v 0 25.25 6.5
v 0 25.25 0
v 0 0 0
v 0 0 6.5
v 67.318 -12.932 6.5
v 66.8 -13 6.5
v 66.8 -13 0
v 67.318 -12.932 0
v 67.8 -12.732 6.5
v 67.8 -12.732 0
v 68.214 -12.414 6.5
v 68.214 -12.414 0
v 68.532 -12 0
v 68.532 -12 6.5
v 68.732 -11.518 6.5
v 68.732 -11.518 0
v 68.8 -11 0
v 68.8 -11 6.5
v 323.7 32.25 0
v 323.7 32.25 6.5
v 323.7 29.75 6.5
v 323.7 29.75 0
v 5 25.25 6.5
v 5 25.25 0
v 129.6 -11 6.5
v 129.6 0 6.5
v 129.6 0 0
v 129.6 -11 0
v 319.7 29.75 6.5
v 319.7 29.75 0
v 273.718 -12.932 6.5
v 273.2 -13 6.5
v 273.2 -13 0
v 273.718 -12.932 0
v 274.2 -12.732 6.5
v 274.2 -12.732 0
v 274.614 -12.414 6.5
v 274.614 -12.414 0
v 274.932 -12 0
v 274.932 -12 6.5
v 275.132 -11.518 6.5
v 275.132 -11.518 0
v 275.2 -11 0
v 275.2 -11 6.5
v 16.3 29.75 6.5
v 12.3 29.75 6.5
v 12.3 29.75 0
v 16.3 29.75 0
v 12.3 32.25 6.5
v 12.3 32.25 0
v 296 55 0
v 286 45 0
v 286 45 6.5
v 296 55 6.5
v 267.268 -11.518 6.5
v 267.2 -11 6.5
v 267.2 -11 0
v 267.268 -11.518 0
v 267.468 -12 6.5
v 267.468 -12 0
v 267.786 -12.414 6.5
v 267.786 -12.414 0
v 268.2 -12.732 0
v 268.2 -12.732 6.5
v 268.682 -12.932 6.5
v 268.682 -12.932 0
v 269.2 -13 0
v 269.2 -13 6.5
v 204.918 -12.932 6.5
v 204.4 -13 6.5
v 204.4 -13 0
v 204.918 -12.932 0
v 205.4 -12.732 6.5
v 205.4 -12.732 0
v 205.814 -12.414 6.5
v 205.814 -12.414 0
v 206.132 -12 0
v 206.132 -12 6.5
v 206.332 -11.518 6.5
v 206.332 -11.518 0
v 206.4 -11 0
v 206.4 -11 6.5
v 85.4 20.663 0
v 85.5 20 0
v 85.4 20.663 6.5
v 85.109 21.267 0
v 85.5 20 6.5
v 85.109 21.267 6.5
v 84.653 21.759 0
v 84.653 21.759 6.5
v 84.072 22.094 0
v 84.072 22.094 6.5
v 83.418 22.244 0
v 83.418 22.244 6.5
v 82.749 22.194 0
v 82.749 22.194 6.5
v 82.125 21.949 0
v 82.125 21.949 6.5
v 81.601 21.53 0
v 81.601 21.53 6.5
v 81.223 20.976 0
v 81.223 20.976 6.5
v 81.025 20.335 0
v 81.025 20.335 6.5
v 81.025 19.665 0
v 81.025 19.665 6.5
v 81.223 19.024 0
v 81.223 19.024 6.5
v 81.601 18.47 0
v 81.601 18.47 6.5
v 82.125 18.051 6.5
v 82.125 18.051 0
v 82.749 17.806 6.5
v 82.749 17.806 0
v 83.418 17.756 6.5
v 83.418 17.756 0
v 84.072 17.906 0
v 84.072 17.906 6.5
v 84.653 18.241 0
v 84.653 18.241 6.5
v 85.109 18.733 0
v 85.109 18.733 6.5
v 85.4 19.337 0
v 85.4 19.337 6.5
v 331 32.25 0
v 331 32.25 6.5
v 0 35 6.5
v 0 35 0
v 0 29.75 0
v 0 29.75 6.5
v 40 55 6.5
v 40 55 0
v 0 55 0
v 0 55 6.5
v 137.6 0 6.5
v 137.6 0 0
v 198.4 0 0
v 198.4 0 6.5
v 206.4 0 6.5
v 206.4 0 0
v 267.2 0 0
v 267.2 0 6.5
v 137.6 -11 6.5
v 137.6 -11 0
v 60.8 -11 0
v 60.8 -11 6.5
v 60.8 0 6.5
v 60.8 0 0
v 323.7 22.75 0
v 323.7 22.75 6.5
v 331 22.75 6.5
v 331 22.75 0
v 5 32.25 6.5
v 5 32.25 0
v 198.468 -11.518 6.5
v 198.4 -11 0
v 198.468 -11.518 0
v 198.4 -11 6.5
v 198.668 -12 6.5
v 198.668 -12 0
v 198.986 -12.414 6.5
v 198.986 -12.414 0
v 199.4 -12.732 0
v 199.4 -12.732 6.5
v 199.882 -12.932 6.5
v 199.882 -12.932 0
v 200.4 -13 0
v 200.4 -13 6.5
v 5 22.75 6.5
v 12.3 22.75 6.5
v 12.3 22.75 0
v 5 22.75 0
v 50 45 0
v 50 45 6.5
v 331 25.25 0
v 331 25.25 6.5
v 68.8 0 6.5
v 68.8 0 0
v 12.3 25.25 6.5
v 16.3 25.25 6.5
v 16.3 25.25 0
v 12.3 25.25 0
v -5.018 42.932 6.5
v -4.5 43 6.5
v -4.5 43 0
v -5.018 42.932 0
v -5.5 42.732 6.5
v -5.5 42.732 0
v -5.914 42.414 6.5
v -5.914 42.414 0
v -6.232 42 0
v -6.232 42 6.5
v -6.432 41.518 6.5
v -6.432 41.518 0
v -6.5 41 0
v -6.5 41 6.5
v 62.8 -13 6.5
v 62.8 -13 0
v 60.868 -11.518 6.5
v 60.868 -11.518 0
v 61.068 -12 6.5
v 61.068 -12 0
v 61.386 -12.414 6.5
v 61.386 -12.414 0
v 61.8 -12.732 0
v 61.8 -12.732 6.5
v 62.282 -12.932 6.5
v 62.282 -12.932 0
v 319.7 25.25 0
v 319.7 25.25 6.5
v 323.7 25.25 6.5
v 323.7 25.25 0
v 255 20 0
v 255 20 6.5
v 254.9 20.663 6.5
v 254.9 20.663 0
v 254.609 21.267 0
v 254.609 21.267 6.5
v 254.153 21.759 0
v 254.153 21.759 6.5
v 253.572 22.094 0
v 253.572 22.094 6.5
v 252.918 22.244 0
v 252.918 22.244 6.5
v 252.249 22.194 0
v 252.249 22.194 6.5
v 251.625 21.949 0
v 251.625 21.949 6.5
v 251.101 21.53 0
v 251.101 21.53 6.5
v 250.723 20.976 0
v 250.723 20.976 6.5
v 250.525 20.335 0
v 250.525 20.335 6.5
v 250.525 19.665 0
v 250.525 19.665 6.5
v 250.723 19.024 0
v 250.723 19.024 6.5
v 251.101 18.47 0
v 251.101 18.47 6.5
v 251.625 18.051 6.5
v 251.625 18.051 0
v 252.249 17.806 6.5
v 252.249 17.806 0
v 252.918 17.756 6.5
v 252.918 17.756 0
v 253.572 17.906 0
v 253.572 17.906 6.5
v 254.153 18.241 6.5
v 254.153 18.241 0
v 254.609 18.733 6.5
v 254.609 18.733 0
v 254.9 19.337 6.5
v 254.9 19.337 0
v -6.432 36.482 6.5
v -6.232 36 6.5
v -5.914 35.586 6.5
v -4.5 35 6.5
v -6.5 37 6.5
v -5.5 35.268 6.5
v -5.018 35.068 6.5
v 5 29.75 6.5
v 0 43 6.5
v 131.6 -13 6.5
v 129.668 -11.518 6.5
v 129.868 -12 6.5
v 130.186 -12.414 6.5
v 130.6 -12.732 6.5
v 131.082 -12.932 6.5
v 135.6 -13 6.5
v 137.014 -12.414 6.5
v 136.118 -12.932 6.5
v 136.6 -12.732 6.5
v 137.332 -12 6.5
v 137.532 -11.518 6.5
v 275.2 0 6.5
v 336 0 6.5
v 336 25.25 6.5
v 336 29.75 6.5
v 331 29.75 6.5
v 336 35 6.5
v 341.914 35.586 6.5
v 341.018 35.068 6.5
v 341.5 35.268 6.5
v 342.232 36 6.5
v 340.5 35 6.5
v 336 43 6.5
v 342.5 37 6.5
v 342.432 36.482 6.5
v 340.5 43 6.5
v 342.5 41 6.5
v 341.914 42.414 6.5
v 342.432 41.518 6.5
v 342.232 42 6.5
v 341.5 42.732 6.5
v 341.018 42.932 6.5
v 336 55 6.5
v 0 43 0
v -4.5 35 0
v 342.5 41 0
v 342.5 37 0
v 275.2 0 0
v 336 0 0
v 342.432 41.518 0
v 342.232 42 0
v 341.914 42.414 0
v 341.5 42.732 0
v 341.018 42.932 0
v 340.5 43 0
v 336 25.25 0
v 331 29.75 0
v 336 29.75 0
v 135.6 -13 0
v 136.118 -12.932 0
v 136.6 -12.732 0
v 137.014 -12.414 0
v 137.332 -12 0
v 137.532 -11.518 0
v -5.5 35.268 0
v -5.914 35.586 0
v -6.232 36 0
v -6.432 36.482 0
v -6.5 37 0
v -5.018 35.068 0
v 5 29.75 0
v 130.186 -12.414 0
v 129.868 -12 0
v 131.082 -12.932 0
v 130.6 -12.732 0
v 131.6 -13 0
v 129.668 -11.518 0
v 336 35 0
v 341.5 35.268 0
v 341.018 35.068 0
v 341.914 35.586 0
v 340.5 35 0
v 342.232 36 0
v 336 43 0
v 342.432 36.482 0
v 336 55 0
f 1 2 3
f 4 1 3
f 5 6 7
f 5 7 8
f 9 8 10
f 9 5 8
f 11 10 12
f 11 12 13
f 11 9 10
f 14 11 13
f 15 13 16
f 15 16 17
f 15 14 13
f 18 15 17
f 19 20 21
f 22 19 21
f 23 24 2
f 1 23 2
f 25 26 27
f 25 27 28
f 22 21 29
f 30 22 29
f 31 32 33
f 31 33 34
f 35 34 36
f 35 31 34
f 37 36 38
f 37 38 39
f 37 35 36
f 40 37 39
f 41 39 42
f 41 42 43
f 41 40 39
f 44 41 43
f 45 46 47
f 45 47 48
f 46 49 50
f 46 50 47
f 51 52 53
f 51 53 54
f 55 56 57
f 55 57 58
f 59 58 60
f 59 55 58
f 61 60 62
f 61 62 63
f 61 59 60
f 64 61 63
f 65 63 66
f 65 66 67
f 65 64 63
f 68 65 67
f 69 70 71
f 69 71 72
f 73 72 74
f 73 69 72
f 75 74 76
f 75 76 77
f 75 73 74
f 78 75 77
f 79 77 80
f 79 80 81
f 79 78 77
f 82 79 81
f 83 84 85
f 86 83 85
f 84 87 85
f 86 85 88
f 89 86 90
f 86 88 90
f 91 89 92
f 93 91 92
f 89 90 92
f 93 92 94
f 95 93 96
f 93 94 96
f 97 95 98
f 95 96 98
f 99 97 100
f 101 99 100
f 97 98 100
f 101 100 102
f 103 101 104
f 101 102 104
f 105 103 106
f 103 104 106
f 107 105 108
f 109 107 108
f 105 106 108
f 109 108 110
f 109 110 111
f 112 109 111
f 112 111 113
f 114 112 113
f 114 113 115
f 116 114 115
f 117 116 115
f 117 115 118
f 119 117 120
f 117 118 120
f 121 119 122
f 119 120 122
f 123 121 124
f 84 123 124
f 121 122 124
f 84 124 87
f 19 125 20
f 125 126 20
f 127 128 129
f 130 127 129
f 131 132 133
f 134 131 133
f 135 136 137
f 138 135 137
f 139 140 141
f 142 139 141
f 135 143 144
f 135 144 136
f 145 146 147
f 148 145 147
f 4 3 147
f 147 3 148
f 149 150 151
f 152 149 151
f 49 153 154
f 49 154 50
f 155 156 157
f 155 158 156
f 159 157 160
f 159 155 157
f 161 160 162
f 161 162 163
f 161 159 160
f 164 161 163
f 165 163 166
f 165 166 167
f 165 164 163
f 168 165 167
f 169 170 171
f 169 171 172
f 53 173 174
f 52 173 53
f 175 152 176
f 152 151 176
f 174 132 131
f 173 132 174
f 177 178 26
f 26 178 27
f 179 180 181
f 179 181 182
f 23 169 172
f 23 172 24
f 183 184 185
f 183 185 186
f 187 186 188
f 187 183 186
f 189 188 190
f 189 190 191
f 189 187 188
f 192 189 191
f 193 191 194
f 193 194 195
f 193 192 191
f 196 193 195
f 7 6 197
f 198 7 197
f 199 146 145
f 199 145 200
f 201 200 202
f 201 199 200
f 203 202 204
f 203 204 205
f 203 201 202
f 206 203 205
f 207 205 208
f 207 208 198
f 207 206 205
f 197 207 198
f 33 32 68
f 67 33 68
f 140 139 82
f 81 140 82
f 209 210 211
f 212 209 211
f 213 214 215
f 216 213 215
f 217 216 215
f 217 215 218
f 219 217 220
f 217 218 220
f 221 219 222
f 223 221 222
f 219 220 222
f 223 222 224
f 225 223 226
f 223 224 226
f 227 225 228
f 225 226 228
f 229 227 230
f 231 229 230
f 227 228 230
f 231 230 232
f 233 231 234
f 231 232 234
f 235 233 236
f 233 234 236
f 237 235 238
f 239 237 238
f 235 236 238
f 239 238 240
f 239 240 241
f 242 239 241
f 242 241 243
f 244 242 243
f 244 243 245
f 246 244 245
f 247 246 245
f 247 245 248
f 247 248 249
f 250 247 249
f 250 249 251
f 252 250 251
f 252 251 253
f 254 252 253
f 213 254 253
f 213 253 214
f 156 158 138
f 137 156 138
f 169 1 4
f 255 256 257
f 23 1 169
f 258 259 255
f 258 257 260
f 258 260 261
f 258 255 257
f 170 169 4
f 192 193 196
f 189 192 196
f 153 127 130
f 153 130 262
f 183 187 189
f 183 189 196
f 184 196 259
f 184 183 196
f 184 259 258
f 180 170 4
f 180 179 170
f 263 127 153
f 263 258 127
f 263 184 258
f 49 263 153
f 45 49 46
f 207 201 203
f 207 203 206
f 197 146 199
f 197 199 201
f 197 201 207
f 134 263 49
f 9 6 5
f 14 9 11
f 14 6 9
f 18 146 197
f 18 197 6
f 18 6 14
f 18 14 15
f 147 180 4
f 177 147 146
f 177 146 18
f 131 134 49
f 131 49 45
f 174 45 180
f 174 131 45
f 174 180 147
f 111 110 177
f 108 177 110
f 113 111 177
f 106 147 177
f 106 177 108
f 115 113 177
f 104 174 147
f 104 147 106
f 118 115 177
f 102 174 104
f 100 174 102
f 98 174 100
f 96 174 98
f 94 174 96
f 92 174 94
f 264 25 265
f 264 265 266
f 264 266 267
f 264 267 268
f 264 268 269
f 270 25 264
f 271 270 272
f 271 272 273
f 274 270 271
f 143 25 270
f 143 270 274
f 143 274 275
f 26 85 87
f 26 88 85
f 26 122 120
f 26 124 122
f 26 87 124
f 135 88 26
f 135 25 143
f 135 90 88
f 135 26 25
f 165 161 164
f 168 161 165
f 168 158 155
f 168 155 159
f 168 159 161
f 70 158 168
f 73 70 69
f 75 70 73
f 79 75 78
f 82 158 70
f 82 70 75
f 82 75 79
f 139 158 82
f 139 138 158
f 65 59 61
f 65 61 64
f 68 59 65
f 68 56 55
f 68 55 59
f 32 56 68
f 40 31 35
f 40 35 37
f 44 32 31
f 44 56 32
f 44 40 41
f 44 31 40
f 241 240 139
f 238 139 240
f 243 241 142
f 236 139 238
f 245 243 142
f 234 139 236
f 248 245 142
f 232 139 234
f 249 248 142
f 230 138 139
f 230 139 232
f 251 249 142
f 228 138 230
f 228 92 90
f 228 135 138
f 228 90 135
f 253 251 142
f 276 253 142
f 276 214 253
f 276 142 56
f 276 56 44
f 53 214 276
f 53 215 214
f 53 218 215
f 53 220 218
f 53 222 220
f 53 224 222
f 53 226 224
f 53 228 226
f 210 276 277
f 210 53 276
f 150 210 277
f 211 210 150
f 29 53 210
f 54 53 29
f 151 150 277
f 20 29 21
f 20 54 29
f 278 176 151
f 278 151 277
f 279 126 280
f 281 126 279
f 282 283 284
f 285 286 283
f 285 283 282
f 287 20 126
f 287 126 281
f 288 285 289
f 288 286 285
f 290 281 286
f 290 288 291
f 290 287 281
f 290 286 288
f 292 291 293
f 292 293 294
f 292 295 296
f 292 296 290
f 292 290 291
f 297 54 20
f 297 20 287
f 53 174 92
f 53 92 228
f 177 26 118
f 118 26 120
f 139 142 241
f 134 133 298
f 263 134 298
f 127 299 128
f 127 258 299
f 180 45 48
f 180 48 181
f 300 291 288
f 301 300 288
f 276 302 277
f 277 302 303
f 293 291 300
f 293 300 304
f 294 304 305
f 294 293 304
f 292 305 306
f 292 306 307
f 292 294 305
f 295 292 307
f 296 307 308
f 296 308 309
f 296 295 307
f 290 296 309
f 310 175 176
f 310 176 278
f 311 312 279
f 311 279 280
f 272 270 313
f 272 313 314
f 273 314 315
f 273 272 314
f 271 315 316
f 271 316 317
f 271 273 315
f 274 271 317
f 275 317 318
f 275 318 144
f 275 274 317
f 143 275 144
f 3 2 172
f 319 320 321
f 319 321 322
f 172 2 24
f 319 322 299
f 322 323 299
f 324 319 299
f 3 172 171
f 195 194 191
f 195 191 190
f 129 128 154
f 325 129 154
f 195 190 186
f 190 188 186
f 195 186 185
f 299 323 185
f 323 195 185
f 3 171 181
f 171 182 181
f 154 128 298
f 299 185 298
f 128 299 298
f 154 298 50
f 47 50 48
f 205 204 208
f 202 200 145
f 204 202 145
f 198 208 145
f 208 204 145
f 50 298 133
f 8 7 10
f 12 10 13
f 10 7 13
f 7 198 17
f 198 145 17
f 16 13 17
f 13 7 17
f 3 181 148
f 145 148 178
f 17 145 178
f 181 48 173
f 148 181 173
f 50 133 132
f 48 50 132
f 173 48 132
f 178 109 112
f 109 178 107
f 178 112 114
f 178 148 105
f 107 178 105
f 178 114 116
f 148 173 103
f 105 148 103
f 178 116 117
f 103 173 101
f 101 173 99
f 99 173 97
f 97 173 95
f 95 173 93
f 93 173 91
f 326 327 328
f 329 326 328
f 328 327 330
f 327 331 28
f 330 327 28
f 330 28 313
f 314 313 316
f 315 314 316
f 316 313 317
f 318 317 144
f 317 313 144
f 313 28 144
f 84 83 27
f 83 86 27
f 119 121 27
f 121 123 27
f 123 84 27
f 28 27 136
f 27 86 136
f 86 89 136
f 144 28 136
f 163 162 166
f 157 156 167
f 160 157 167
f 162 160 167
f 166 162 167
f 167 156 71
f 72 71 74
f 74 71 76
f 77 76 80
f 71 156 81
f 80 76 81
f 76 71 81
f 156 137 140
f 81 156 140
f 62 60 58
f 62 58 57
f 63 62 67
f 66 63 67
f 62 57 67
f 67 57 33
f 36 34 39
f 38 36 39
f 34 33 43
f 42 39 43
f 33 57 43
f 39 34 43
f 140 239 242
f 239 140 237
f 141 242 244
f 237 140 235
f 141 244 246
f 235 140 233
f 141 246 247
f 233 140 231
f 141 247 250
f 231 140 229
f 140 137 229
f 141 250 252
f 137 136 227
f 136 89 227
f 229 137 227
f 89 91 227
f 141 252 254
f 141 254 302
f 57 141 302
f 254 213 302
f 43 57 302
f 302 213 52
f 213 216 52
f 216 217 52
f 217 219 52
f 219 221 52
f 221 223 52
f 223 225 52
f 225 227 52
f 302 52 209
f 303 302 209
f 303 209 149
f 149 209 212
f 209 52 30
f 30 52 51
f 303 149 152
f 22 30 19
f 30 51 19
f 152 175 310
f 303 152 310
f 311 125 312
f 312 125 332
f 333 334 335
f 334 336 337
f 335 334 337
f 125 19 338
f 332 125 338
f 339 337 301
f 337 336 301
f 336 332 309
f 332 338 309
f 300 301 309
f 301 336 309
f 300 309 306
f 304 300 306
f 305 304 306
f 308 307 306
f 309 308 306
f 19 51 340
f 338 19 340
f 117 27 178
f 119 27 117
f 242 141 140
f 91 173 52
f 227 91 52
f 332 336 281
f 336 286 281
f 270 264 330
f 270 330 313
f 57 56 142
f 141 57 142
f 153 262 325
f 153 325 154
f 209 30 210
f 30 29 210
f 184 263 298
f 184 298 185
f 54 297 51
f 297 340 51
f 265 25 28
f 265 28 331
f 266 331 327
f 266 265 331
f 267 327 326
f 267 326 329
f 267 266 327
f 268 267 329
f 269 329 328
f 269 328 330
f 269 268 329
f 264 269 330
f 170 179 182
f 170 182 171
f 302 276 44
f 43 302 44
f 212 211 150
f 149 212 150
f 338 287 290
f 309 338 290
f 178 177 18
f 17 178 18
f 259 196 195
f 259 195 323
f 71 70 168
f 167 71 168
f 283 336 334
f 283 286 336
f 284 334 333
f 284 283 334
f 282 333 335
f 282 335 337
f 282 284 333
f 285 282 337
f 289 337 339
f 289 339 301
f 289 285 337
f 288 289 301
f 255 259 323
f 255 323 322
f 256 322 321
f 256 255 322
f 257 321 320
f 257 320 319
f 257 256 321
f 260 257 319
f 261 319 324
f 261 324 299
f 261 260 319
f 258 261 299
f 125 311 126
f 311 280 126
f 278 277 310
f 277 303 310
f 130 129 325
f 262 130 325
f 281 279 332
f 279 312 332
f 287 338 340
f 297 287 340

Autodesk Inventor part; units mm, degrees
ref_plane "YZ Plane" through (0, 0, 0) normal (1, 0, 0) x (0, 1, 0)
ref_plane "XZ Plane" through (0, 0, 0) normal (0, 1, 0) x (-1, 0, 0)
ref_plane "XY Plane" through (0, 0, 0) normal (0, 0, 1) x (1, 0, 0)
sketch "Sketch1" plane through (0, 0, 0) normal (0, 0, 1) x (1, 0, 0)
  line L0 (0, 0) -> (336, 0)
  line L1 (336, 0) -> (336, 55)
  line L2 (0, 55) -> (0, 0)
  line L3 (40, 55) -> (50, 45)
  line L4 (50, 45) -> (286, 45)
  line L5 (286, 45) -> (296, 55)
  line L6 (336, 55) -> (296, 55)
  line L7 (40, 55) -> (0, 55)
  dimension "d0" = 336
  dimension "d1" = 55
  dimension "d2" = 45
  dimension "d3" = 40
  dimension "d4" = 10
  dimension "d5" = 40
extrude "Extrusion1" add sketch "Sketch1" along normal blind 6.5
sketch "Sketch2" plane through (0, 0, 6.5) normal (0, 0, 1) x (1, 0, 0)
  line L0 (0, 0) -> (336, 0) projected
  line L1 (286, 45) -> (50, 45) projected
  line L2 (0, 55) -> (0, 0) projected
  line L3 (0, 25.25) -> (0, 29.75)
  line L4 (16.3, 29.75) -> (16.3, 25.25)
  line L5 (5, 32.25) -> (12.3, 32.25)
  line L6 (12.3, 22.75) -> (5, 22.75)
  line L7 (0, 29.75) -> (5, 29.75)
  line L8 (12.3, 29.75) -> (16.3, 29.75)
  line L9 (16.3, 25.25) -> (12.3, 25.25)
  line L10 (5, 25.25) -> (0, 25.25)
  line L11 (5, 22.75) -> (5, 25.25)
  line L12 (5, 29.75) -> (5, 32.25)
  line L13 (12.3, 32.25) -> (12.3, 29.75)
  line L14 (12.3, 25.25) -> (12.3, 22.75)
  line L15 (168, 0) -> (168, 45) construction
  line L16 (336, 25.25) -> (336, 29.75)
  line L17 (319.7, 29.75) -> (319.7, 25.25)
  line L18 (331, 32.25) -> (323.7, 32.25)
  line L19 (323.7, 22.75) -> (331, 22.75)
  line L20 (336, 29.75) -> (331, 29.75)
  line L21 (323.7, 29.75) -> (319.7, 29.75)
  line L22 (319.7, 25.25) -> (323.7, 25.25)
  line L23 (331, 25.25) -> (336, 25.25)
  line L24 (331, 22.75) -> (331, 25.25)
  line L25 (331, 29.75) -> (331, 32.25)
  line L26 (323.7, 32.25) -> (323.7, 29.75)
  line L27 (323.7, 25.25) -> (323.7, 22.75)
  point P0 (0, 27.5)
  point P1 (0, 27.5)
  point P2 (336, 27.5)
  point P3 (336, 27.5)
  dimension "d8" = 4.5
  dimension "d9" = 2.5
  dimension "d10" = 2.5
  dimension "d11" = 5
  dimension "d12" = 7.3
  dimension "d13" = 4
extrude "Extrusion2" cut sketch "Sketch2" against normal through all
sketch "Sketch3" plane through (0, 0, 6.5) normal (0, 0, 1) x (1, 0, 0)
  line L0 (0, 25.25) -> (0, 0) projected
  line L1 (0, 0) -> (336, 0) projected
  line L2 (336, 0) -> (336, 25.25) projected
  line L3 (336, 29.75) -> (336, 55) projected
  line L4 (0, 55) -> (0, 29.75) projected
  line L5 (16.3, 29.75) -> (16.3, 25.25) projected
  line L6 (0, 43) -> (-4.5, 43)
  line L7 (-6.5, 41) -> (-6.5, 37)
  line L8 (-4.5, 35) -> (0, 35)
  line L9 (0, 35) -> (0, 43)
  line L10 (0, 20) -> (-4.5, 20)
  line L11 (-6.5, 18) -> (-6.5, 14)
  line L12 (-4.5, 12) -> (0, 12)
  line L13 (0, 12) -> (0, 20)
  arc A0 (-4.5, 43) -> (-6.5, 41) centre (-4.5, 41) ccw
  arc A1 (-6.5, 37) -> (-4.5, 35) centre (-4.5, 37) ccw
  arc A2 (-4.5, 20) -> (-6.5, 18) centre (-4.5, 18) ccw
  arc A3 (-6.5, 14) -> (-4.5, 12) centre (-4.5, 14) ccw
  line L14 (336, 43) -> (340.5, 43)
  line L15 (342.5, 41) -> (342.5, 37)
  line L16 (340.5, 35) -> (336, 35)
  line L17 (336, 35) -> (336, 43)
  line L18 (336, 20) -> (340.5, 20)
  line L19 (342.5, 18) -> (342.5, 14)
  line L20 (340.5, 12) -> (336, 12)
  line L21 (336, 12) -> (336, 20)
  arc A4 (342.5, 41) -> (340.5, 43) centre (340.5, 41) ccw
  arc A5 (340.5, 35) -> (342.5, 37) centre (340.5, 37) ccw
  arc A6 (342.5, 18) -> (340.5, 20) centre (340.5, 18) ccw
  arc A7 (340.5, 12) -> (342.5, 14) centre (340.5, 14) ccw
  line L22 (198.4, 0) -> (206.4, 0)
  line L23 (206.4, 0) -> (206.4, -11)
  line L24 (204.4, -13) -> (200.4, -13)
  line L25 (198.4, -11) -> (198.4, 0)
  line L26 (137.6, 0) -> (129.6, 0)
  line L27 (129.6, 0) -> (129.6, -11)
  line L28 (131.6, -13) -> (135.6, -13)
  line L29 (137.6, -11) -> (137.6, 0)
  line L30 (60.8, 0) -> (68.8, 0)
  line L31 (68.8, 0) -> (68.8, -11)
  line L32 (66.8, -13) -> (62.8, -13)
  line L33 (60.8, -11) -> (60.8, 0)
  line L34 (267.2, 0) -> (275.2, 0)
  line L35 (275.2, 0) -> (275.2, -11)
  line L36 (273.2, -13) -> (269.2, -13)
  line L37 (267.2, -11) -> (267.2, 0)
  arc A8 (60.8, -11) -> (62.8, -13) centre (62.8, -11) ccw
  arc A9 (66.8, -13) -> (68.8, -11) centre (66.8, -11) ccw
  arc A10 (129.6, -11) -> (131.6, -13) centre (131.6, -11) ccw
  arc A11 (135.6, -13) -> (137.6, -11) centre (135.6, -11) ccw
  arc A12 (198.4, -11) -> (200.4, -13) centre (200.4, -11) ccw
  arc A13 (204.4, -13) -> (206.4, -11) centre (204.4, -11) ccw
  arc A14 (267.2, -11) -> (269.2, -13) centre (269.2, -11) ccw
  arc A15 (273.2, -13) -> (275.2, -11) centre (273.2, -11) ccw
  line L38 (68.8, -5.5) -> (129.6, -5.5) construction
  line L39 (137.6, -5.5) -> (198.4, -5.5) construction
  line L40 (206.4, -5.5) -> (267.2, -5.5) construction
  line L41 (275.2, -5.5) -> (336, -5.5) construction
  line L42 (60.8, -5.5) -> (0, -5.5) construction
  point P0 (16.3, 27.5)
  point P1 (168, 0)
  dimension "d16" = 2
  dimension "d17" = 8
  dimension "d18" = 8
  dimension "d19" = 15
  dimension "d20" = 7.5
  dimension "d21" = 6.5
  dimension "d22" = 2
  dimension "d23" = 6.5
  dimension "d24" = 2
  dimension "d25" = 8
  dimension "d26" = 8
  dimension "d27" = 8
  dimension "d28" = 8
  dimension "d29" = 13
extrude "Extrusion3" add sketch "Sketch3" against normal blind 6.5
sketch "Sketch4" plane through (0, 0, 6.5) normal (0, 0, 1) x (1, 0, 0)
  line L0 (0, 20) -> (-4.5, 20) projected
  arc A0 (-4.5, 20) -> (-6.5, 18) centre (-4.5, 18) ccw projected
  line L1 (-6.5, 18) -> (-6.5, 14) projected
  arc A1 (-6.5, 14) -> (-4.5, 12) centre (-4.5, 14) ccw projected
  line L2 (-4.5, 12) -> (0, 12) projected
  line L3 (336, 12) -> (340.5, 12) projected
  arc A2 (340.5, 12) -> (342.5, 14) centre (340.5, 14) ccw projected
  line L4 (342.5, 14) -> (342.5, 18) projected
  arc A3 (342.5, 18) -> (340.5, 20) centre (340.5, 18) ccw projected
  line L5 (340.5, 20) -> (336, 20) projected
  line L6 (5, 22.75) -> (5, 25.25) projected
  line L7 (0, 20) -> (0, 12)
  line L8 (336, 20) -> (336, 12)
extrude "Extrusion4" cut sketch "Sketch4" against normal through all
sketch "Sketch5" plane through (0, 0, 6.5) normal (0, 0, 1) x (1, 0, 0)
  line L0 (0, 25.25) -> (0, 0) projected
  line L1 (0, 0) -> (60.8, 0) projected
  line L2 (336, 0) -> (336, 25.25) projected
  circle A0 centre (83.25, 20) radius 2.25
  circle A1 centre (252.75, 20) radius 2.25
  dimension "d34" = 4.5
  dimension "d35" = 20
  dimension "d36" = 83.25
  dimension "d37" = 83.25
extrude "Extrusion5" cut sketch "Sketch5" against normal through all
equation "\"d5\" = d3"
equation "\"d23\" = d21"
equation "\"d37\" = d36"
properties part number "frame_brace_top" material "Plywood, Finish"
